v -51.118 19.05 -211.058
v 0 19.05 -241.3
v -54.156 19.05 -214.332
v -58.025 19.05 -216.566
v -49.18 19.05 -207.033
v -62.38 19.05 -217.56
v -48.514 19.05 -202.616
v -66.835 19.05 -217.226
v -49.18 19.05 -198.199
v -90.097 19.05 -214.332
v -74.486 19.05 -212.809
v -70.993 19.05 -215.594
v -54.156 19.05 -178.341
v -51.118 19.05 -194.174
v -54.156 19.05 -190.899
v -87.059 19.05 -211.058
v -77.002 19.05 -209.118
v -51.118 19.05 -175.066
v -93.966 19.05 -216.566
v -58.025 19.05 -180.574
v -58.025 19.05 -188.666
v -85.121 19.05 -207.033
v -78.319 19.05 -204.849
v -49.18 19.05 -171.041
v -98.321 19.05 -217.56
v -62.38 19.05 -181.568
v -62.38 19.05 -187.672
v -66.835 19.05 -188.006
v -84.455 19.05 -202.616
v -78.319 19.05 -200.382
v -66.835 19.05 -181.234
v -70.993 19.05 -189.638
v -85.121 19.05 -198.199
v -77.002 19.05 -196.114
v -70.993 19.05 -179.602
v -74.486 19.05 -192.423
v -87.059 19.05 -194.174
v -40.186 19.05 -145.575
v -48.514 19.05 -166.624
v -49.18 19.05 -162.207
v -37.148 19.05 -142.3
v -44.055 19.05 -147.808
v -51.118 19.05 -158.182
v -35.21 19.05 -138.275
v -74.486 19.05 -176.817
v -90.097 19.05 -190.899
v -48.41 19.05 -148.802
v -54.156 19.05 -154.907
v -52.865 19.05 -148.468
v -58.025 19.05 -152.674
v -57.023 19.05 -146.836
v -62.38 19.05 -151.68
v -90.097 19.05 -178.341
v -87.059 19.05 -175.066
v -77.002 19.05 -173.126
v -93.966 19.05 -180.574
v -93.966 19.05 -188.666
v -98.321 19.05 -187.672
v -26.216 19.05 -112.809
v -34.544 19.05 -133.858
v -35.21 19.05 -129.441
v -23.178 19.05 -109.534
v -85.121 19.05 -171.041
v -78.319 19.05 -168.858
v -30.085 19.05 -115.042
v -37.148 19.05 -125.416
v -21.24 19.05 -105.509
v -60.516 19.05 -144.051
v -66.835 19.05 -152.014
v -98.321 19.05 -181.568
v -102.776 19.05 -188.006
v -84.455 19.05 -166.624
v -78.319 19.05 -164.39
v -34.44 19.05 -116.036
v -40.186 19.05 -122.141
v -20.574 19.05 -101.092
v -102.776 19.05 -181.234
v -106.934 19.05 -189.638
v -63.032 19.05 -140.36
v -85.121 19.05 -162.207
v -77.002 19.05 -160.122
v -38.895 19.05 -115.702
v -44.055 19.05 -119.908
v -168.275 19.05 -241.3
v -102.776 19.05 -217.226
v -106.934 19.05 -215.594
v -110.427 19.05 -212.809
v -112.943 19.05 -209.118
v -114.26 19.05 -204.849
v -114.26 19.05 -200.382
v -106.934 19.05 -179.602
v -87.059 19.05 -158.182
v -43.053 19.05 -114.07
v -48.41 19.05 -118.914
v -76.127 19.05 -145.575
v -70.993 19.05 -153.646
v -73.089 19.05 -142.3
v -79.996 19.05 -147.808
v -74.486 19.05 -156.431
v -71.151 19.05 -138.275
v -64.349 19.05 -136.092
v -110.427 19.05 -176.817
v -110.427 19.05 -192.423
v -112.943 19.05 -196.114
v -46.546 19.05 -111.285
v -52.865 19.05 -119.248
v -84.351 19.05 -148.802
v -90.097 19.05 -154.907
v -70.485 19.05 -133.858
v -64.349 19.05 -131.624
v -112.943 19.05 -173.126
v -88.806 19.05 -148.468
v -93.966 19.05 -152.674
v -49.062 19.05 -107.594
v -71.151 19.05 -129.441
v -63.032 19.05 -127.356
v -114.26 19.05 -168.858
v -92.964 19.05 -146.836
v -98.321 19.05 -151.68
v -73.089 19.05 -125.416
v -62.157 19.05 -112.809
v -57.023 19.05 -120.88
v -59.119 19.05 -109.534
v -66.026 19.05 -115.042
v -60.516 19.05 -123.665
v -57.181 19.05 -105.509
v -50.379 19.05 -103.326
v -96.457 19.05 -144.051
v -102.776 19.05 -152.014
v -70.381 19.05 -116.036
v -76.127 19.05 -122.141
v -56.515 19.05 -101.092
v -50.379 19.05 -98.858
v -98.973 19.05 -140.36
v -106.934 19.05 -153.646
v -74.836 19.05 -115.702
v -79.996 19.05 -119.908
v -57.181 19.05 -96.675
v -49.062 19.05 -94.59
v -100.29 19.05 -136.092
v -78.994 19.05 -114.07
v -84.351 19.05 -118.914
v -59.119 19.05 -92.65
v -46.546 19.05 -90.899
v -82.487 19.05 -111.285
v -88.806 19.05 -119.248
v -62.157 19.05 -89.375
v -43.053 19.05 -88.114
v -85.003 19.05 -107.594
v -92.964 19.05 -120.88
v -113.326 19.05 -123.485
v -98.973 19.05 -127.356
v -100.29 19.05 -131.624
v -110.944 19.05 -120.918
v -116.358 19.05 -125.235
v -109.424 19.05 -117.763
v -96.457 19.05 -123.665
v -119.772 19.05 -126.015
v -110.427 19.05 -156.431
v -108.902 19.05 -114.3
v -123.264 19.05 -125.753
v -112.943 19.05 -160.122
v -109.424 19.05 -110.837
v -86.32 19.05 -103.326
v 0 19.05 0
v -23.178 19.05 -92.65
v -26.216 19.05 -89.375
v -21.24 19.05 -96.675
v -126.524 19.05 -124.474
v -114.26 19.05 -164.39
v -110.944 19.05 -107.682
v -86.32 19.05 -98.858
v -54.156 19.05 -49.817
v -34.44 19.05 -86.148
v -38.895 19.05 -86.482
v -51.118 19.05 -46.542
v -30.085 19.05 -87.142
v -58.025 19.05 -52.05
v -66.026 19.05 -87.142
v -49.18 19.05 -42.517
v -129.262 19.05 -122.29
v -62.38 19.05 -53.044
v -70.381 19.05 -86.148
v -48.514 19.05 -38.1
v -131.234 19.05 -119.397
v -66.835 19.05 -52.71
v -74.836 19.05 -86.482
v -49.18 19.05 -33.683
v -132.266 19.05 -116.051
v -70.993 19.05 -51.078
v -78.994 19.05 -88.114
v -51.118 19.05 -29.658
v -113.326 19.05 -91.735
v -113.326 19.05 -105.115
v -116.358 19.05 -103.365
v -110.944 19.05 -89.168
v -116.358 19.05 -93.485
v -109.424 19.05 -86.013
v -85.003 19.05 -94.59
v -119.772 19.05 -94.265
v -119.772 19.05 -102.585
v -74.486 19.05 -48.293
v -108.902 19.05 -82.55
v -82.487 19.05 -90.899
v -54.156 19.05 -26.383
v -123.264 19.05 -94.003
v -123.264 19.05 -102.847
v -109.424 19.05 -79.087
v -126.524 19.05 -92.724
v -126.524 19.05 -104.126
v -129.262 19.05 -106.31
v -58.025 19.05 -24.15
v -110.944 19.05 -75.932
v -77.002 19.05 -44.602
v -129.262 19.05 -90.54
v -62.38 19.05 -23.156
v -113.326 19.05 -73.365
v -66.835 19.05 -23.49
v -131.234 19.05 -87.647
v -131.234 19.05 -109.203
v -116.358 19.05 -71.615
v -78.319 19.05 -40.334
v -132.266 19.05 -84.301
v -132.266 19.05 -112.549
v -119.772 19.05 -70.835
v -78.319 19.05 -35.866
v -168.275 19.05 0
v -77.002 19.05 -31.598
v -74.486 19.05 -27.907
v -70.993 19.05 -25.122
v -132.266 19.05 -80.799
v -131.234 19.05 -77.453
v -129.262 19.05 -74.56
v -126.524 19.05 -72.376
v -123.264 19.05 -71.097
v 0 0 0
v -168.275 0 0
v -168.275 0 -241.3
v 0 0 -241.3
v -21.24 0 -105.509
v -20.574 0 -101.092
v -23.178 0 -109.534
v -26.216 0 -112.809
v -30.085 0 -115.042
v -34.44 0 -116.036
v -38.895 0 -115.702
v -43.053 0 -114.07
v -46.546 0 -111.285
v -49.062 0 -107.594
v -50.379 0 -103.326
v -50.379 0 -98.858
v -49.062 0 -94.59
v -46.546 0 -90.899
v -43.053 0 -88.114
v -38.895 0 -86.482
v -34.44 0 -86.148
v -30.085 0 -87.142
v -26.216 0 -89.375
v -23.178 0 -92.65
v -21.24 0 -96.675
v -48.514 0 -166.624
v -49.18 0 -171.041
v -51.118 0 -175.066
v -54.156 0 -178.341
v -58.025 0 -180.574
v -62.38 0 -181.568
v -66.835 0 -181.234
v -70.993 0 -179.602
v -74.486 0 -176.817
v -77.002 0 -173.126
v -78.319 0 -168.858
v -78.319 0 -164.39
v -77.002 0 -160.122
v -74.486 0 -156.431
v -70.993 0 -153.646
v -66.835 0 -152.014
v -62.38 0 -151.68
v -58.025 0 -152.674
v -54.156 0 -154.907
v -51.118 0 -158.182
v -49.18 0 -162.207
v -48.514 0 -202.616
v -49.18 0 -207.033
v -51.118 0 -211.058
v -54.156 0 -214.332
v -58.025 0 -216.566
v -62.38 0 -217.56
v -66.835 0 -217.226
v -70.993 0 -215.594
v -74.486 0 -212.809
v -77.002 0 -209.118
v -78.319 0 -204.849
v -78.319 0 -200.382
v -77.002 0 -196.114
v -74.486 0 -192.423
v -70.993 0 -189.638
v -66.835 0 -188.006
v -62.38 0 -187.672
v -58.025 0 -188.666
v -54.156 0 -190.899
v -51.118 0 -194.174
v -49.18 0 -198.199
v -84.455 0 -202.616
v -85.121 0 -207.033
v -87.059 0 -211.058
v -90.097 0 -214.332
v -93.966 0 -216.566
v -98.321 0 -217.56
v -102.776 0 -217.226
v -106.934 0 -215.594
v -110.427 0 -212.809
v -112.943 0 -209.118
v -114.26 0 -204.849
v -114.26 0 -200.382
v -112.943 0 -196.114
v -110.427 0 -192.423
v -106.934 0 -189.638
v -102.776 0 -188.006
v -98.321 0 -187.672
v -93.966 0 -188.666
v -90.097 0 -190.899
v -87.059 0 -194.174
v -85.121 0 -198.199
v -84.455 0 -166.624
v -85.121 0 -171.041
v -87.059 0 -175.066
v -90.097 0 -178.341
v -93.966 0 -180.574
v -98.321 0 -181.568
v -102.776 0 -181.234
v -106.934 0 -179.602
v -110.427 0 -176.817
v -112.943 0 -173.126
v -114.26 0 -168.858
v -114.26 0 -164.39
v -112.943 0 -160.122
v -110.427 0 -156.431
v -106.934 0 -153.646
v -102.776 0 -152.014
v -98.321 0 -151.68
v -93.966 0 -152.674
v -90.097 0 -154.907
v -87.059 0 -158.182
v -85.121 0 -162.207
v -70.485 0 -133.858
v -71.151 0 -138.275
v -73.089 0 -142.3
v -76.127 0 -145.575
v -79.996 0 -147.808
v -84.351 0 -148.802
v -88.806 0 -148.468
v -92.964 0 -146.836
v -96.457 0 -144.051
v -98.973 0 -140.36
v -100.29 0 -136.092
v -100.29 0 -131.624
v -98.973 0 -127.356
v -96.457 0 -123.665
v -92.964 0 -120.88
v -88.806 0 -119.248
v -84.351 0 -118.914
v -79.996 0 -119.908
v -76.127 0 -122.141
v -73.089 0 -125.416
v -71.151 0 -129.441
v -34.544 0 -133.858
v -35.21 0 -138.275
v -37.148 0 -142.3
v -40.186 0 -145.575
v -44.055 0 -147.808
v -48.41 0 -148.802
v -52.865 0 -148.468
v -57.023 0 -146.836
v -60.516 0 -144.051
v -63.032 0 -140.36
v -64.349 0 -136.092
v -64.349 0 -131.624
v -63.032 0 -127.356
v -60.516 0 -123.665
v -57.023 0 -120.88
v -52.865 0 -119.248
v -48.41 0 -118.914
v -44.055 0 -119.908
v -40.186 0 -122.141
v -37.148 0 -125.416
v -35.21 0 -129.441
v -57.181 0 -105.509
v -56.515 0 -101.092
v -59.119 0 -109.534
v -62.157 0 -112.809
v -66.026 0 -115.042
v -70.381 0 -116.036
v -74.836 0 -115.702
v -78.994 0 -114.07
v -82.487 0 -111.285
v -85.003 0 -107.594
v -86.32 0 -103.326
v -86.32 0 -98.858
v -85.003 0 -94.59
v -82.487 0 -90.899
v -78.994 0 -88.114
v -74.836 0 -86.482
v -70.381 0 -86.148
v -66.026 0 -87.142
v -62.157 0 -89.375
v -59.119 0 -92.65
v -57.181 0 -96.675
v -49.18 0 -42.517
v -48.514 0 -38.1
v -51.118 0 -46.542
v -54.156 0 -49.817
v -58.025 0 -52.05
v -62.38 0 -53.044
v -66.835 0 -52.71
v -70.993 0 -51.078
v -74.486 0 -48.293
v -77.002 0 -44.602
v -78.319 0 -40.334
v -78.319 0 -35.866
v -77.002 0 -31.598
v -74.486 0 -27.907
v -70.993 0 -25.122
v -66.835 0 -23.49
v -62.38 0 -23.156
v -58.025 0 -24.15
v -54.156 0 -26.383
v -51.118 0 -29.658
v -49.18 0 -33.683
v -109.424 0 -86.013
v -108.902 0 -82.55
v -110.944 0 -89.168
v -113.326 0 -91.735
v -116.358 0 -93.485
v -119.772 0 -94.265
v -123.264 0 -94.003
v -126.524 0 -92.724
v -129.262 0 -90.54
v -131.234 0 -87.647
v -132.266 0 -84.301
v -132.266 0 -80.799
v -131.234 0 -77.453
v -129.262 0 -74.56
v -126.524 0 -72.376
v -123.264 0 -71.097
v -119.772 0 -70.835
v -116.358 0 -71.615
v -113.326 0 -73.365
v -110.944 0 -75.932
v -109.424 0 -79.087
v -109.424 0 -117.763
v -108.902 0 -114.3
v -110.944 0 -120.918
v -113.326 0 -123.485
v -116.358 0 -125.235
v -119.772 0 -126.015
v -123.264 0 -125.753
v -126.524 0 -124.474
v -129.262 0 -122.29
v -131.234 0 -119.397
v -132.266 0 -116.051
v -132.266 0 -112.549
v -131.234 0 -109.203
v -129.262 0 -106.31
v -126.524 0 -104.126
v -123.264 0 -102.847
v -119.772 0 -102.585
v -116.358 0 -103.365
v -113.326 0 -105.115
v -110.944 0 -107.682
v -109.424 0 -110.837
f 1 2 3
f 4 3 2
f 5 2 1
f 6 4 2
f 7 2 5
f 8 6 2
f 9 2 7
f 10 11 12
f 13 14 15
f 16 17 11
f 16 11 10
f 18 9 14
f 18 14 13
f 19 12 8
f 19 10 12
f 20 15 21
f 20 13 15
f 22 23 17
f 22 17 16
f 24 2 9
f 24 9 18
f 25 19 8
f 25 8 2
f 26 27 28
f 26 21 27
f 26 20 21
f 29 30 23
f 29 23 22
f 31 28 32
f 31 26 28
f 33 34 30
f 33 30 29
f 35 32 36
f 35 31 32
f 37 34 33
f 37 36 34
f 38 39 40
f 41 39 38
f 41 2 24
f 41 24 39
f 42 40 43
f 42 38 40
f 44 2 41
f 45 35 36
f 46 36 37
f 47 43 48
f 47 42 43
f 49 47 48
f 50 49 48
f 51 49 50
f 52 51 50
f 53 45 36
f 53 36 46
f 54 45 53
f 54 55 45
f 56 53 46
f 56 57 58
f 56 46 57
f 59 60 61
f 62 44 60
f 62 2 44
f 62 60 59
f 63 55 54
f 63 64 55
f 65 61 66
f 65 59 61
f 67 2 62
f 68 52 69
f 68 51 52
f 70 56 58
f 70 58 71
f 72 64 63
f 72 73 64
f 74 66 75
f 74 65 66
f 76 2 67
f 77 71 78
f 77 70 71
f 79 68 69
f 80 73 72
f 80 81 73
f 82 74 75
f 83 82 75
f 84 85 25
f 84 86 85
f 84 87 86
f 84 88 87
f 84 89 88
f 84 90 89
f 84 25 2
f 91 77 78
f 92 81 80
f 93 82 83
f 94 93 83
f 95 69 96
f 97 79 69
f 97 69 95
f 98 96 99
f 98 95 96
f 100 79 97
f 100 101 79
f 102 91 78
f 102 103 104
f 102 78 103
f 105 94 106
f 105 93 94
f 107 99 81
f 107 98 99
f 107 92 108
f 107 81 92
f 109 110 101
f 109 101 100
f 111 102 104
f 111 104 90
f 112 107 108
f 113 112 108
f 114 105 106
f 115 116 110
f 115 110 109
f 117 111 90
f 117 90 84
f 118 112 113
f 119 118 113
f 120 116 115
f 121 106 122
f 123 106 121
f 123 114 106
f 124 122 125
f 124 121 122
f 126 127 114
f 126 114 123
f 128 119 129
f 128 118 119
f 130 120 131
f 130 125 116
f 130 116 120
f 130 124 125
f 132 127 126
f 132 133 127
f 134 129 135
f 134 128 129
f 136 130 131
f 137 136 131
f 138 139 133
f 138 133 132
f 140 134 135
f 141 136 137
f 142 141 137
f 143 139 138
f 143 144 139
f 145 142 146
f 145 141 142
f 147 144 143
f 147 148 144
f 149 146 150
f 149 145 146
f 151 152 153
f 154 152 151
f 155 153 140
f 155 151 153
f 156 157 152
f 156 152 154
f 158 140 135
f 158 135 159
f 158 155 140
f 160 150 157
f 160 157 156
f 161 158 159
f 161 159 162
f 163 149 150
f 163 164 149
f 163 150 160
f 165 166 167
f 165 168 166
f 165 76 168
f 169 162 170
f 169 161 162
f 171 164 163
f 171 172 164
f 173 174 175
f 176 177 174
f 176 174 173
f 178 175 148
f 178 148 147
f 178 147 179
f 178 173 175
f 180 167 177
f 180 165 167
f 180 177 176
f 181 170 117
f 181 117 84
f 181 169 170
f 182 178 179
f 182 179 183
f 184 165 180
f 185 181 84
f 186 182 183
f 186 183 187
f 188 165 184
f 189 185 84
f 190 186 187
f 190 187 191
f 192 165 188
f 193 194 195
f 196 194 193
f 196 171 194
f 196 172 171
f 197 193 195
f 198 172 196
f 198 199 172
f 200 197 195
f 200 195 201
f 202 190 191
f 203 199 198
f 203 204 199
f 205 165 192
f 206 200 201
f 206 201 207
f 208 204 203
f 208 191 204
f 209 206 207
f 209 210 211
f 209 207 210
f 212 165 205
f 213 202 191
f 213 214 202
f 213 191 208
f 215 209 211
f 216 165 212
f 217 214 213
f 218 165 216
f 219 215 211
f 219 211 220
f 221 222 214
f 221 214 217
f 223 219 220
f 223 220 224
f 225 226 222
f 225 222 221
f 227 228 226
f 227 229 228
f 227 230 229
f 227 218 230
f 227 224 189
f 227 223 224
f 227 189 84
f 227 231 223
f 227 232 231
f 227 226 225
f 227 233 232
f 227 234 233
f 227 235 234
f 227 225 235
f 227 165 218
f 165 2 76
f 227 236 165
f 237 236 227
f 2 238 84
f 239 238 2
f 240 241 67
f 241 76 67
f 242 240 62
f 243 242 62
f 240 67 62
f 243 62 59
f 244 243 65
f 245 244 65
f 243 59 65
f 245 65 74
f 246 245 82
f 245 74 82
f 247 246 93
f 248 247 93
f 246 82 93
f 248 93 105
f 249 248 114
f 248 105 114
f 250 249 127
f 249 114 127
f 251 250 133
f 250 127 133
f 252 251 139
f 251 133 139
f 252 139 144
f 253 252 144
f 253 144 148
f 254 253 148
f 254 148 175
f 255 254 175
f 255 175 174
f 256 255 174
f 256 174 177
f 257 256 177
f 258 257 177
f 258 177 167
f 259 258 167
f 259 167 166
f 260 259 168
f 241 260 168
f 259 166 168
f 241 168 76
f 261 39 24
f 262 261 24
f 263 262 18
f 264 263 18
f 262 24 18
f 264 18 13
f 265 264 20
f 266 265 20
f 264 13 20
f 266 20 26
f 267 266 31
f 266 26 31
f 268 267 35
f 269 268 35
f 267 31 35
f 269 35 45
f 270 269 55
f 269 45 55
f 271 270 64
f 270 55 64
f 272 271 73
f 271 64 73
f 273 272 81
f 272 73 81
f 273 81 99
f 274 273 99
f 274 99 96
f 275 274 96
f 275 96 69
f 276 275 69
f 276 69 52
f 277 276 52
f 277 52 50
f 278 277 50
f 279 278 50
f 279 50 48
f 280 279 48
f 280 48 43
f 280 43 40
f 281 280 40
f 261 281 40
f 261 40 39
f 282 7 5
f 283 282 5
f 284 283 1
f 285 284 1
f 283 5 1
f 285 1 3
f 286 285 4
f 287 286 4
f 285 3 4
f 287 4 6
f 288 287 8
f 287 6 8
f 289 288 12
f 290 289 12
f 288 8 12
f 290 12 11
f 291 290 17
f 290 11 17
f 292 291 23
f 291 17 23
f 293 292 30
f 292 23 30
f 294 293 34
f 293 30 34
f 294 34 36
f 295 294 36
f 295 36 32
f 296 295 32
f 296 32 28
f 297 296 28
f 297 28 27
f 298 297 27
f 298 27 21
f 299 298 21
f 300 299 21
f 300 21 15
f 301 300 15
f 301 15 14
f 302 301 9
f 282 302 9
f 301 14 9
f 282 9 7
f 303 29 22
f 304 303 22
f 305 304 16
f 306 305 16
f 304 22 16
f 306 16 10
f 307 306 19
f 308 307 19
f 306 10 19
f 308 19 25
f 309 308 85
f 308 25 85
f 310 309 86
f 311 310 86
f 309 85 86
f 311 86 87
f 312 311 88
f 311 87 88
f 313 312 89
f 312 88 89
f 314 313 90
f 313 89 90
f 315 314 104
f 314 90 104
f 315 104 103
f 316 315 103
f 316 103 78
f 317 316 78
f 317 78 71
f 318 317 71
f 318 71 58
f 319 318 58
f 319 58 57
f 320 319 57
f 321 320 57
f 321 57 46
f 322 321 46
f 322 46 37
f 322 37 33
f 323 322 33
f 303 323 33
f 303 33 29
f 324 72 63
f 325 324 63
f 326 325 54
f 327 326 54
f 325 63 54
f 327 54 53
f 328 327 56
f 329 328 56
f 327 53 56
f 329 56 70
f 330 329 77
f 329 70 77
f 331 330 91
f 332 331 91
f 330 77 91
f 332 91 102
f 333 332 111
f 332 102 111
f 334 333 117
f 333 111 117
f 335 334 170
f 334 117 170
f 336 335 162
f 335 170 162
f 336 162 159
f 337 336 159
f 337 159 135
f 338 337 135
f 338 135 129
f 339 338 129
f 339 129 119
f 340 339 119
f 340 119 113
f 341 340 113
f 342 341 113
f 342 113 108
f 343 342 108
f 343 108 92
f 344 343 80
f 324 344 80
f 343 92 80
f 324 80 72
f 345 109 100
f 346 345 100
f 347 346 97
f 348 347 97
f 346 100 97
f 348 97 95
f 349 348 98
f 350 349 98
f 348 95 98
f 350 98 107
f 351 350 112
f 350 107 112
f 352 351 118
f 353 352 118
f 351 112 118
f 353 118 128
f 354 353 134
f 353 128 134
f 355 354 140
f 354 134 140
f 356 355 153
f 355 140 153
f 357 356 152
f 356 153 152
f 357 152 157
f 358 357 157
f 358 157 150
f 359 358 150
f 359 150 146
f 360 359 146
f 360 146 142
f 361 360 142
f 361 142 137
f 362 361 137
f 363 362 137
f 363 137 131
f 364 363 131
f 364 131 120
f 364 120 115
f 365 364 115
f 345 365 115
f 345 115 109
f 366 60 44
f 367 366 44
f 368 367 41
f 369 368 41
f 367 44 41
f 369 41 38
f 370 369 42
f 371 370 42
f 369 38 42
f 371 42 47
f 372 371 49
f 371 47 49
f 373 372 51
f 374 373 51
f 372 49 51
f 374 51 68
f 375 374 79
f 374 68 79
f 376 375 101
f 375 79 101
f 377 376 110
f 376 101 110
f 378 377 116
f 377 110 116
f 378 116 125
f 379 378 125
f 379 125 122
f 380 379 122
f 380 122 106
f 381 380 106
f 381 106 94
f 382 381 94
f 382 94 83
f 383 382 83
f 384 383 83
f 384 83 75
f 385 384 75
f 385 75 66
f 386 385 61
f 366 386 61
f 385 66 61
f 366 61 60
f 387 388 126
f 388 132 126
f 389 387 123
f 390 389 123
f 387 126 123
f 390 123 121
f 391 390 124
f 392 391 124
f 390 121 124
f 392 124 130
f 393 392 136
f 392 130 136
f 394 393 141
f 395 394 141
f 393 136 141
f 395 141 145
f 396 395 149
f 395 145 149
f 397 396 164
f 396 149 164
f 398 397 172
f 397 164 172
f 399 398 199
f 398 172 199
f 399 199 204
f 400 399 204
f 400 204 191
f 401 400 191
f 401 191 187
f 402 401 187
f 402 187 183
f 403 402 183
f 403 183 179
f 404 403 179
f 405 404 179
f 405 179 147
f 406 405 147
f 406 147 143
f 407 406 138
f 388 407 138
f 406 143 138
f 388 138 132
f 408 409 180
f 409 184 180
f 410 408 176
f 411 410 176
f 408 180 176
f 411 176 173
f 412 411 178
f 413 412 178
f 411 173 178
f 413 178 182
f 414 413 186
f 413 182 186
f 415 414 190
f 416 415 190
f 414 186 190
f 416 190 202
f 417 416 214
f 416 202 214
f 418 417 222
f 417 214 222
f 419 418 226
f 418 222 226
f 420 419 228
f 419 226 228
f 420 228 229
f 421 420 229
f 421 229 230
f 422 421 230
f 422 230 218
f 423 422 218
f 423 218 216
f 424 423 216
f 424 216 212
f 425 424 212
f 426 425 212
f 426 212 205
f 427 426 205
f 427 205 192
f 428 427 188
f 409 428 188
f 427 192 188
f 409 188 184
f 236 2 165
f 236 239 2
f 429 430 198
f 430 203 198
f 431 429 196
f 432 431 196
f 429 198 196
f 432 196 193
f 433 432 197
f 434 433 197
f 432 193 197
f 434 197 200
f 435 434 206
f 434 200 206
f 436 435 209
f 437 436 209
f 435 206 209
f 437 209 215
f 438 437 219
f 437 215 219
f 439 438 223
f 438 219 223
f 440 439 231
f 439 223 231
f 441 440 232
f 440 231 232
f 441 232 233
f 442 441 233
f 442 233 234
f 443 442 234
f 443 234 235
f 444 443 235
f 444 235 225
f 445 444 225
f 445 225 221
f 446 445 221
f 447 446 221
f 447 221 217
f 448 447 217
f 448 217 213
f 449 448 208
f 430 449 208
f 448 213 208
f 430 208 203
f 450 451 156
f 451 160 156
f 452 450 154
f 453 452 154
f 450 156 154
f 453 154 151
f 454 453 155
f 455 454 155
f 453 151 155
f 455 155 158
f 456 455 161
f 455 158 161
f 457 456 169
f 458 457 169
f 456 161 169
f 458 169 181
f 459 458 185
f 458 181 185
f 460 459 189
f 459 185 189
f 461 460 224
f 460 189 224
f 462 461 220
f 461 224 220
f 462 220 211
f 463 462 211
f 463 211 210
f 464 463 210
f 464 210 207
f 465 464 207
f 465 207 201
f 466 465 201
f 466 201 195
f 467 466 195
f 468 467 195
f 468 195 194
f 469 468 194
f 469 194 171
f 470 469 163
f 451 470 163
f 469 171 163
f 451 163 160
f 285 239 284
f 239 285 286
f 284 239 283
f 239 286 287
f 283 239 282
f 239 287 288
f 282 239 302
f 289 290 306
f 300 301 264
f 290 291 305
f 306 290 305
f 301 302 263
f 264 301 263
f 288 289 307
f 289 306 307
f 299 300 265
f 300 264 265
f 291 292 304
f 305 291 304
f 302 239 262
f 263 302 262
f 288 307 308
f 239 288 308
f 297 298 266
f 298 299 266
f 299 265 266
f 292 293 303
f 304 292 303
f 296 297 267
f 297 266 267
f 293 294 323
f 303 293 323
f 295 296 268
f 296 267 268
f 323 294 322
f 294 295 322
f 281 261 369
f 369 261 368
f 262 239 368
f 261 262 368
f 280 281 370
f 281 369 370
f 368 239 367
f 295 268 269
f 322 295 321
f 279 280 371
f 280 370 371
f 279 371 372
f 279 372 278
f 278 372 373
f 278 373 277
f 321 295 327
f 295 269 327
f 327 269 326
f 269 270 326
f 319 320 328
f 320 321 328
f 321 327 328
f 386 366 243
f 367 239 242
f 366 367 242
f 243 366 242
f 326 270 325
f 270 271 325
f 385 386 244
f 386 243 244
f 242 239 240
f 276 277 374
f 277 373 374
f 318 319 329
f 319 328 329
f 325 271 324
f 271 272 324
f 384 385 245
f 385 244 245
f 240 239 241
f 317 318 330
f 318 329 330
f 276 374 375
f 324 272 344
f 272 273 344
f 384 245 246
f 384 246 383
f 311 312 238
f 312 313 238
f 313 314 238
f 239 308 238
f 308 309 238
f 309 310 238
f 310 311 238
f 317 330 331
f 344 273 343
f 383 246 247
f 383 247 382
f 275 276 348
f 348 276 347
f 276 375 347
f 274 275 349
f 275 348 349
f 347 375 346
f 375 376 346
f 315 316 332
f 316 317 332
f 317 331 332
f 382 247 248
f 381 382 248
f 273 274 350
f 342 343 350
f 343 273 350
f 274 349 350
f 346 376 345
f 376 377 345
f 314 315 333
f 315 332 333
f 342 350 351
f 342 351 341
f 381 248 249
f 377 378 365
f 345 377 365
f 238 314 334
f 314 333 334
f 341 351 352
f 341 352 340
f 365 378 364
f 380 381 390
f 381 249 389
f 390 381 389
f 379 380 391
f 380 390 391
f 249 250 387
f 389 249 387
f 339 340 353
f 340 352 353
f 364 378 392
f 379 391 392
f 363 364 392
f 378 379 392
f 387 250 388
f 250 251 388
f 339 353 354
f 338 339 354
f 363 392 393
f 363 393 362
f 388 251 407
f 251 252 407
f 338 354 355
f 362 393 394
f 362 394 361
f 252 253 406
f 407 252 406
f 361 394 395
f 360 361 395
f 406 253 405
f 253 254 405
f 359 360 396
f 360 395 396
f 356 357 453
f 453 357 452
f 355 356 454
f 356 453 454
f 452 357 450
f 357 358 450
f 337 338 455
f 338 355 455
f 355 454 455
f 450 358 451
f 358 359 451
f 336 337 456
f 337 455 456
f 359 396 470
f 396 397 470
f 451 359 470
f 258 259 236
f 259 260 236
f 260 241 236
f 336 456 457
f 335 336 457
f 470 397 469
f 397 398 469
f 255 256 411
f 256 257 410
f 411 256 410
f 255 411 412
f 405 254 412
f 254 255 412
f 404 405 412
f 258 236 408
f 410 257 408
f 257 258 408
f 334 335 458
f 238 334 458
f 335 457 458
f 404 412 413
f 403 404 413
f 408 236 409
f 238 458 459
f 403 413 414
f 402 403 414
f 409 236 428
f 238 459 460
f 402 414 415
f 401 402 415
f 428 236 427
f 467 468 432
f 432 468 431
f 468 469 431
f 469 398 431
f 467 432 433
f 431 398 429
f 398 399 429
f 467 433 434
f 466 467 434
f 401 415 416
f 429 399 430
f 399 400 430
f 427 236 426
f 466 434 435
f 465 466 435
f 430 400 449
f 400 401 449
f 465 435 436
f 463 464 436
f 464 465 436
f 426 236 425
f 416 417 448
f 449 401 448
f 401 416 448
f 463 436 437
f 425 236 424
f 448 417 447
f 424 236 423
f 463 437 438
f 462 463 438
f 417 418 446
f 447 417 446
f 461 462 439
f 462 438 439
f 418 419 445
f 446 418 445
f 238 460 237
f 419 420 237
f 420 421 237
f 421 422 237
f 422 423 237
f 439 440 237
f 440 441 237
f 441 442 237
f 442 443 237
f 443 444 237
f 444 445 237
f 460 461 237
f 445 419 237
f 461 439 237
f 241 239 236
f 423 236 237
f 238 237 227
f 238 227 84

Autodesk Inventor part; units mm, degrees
ref_plane "YZ Plane" through (0, 0, 0) normal (1, 0, 0) x (0, 1, 0)
ref_plane "XZ Plane" through (0, 0, 0) normal (0, 1, 0) x (-1, 0, 0)
ref_plane "XY Plane" through (0, 0, 0) normal (0, 0, 1) x (1, 0, 0)
sketch "Sketch1" plane through (0, 0, 0) normal (0, 1, 0) x (-1, 0, 0)
  line L0 (0, 0) -> (168.275, 0)
  line L1 (168.275, 0) -> (168.275, -241.3)
  line L2 (168.275, -241.3) -> (0, -241.3)
  line L3 (0, -241.3) -> (0, 0)
  dimension "d0" = 168.275
  dimension "d1" = 241.3
extrude "Extrusion1" add sketch "Sketch1" along normal blind 19.05
sketch "Sketch2" plane through (0, 19.05, 0) normal (0, 1, 0) x (1, 0, 0)
  circle A0 centre (-63.5, 38.1) radius 14.986
  circle A1 centre (-71.501, 101.092) radius 14.986
  circle A2 centre (-85.471, 133.858) radius 14.986
  circle A3 centre (-99.441, 166.624) radius 14.986
  circle A4 centre (-99.441, 202.6158) radius 14.986
  circle A5 centre (-35.56, 101.092) radius 14.986
  circle A6 centre (-49.53, 133.858) radius 14.986
  circle A7 centre (-63.5, 166.624) radius 14.986
  circle A8 centre (-63.5, 202.6158) radius 14.986
  line L0 (0, 0) -> (-168.275, 0) projected
  circle A9 centre (-120.65, 82.55) radius 11.7475
  circle A10 centre (-120.65, 114.3) radius 11.7475
  line L1 (0, 0) -> (0, 241.3) projected
  dimension "d4" = 29.972
  dimension "d5" = 29.972
  dimension "d6" = 29.972
  dimension "d7" = 29.972
  dimension "d8" = 29.972
  dimension "d9" = 29.972
  dimension "d10" = 29.972
  dimension "d11" = 29.972
  dimension "d12" = 29.972
  dimension "d13" = 62.992
  dimension "d14" = 62.992
  dimension "d15" = 32.766
  dimension "d16" = 32.766
  dimension "d17" = 32.766
  dimension "d18" = 32.766
  dimension "d19" = 35.9918
  dimension "d20" = 35.9918
  dimension "d22" = 13.97
  dimension "d23" = 13.97
  dimension "d24" = 8.001
  dimension "d25" = 8.001
  dimension "d26" = 13.97
  dimension "d27" = 13.97
  dimension "d28" = 13.97
  dimension "d29" = 38.1
  dimension "d30" = 23.495
  dimension "d31" = 82.55
  dimension "d33" = 23.495
  dimension "d35" = 31.75
  dimension "d38" = 63.5
  dimension "d39" = 8.001
  dimension "d40" = 120.65
  dimension "d41" = 120.65
extrude "Extrusion2" cut sketch "Sketch2" against normal blind 25.4
properties part number "controlBoard"
